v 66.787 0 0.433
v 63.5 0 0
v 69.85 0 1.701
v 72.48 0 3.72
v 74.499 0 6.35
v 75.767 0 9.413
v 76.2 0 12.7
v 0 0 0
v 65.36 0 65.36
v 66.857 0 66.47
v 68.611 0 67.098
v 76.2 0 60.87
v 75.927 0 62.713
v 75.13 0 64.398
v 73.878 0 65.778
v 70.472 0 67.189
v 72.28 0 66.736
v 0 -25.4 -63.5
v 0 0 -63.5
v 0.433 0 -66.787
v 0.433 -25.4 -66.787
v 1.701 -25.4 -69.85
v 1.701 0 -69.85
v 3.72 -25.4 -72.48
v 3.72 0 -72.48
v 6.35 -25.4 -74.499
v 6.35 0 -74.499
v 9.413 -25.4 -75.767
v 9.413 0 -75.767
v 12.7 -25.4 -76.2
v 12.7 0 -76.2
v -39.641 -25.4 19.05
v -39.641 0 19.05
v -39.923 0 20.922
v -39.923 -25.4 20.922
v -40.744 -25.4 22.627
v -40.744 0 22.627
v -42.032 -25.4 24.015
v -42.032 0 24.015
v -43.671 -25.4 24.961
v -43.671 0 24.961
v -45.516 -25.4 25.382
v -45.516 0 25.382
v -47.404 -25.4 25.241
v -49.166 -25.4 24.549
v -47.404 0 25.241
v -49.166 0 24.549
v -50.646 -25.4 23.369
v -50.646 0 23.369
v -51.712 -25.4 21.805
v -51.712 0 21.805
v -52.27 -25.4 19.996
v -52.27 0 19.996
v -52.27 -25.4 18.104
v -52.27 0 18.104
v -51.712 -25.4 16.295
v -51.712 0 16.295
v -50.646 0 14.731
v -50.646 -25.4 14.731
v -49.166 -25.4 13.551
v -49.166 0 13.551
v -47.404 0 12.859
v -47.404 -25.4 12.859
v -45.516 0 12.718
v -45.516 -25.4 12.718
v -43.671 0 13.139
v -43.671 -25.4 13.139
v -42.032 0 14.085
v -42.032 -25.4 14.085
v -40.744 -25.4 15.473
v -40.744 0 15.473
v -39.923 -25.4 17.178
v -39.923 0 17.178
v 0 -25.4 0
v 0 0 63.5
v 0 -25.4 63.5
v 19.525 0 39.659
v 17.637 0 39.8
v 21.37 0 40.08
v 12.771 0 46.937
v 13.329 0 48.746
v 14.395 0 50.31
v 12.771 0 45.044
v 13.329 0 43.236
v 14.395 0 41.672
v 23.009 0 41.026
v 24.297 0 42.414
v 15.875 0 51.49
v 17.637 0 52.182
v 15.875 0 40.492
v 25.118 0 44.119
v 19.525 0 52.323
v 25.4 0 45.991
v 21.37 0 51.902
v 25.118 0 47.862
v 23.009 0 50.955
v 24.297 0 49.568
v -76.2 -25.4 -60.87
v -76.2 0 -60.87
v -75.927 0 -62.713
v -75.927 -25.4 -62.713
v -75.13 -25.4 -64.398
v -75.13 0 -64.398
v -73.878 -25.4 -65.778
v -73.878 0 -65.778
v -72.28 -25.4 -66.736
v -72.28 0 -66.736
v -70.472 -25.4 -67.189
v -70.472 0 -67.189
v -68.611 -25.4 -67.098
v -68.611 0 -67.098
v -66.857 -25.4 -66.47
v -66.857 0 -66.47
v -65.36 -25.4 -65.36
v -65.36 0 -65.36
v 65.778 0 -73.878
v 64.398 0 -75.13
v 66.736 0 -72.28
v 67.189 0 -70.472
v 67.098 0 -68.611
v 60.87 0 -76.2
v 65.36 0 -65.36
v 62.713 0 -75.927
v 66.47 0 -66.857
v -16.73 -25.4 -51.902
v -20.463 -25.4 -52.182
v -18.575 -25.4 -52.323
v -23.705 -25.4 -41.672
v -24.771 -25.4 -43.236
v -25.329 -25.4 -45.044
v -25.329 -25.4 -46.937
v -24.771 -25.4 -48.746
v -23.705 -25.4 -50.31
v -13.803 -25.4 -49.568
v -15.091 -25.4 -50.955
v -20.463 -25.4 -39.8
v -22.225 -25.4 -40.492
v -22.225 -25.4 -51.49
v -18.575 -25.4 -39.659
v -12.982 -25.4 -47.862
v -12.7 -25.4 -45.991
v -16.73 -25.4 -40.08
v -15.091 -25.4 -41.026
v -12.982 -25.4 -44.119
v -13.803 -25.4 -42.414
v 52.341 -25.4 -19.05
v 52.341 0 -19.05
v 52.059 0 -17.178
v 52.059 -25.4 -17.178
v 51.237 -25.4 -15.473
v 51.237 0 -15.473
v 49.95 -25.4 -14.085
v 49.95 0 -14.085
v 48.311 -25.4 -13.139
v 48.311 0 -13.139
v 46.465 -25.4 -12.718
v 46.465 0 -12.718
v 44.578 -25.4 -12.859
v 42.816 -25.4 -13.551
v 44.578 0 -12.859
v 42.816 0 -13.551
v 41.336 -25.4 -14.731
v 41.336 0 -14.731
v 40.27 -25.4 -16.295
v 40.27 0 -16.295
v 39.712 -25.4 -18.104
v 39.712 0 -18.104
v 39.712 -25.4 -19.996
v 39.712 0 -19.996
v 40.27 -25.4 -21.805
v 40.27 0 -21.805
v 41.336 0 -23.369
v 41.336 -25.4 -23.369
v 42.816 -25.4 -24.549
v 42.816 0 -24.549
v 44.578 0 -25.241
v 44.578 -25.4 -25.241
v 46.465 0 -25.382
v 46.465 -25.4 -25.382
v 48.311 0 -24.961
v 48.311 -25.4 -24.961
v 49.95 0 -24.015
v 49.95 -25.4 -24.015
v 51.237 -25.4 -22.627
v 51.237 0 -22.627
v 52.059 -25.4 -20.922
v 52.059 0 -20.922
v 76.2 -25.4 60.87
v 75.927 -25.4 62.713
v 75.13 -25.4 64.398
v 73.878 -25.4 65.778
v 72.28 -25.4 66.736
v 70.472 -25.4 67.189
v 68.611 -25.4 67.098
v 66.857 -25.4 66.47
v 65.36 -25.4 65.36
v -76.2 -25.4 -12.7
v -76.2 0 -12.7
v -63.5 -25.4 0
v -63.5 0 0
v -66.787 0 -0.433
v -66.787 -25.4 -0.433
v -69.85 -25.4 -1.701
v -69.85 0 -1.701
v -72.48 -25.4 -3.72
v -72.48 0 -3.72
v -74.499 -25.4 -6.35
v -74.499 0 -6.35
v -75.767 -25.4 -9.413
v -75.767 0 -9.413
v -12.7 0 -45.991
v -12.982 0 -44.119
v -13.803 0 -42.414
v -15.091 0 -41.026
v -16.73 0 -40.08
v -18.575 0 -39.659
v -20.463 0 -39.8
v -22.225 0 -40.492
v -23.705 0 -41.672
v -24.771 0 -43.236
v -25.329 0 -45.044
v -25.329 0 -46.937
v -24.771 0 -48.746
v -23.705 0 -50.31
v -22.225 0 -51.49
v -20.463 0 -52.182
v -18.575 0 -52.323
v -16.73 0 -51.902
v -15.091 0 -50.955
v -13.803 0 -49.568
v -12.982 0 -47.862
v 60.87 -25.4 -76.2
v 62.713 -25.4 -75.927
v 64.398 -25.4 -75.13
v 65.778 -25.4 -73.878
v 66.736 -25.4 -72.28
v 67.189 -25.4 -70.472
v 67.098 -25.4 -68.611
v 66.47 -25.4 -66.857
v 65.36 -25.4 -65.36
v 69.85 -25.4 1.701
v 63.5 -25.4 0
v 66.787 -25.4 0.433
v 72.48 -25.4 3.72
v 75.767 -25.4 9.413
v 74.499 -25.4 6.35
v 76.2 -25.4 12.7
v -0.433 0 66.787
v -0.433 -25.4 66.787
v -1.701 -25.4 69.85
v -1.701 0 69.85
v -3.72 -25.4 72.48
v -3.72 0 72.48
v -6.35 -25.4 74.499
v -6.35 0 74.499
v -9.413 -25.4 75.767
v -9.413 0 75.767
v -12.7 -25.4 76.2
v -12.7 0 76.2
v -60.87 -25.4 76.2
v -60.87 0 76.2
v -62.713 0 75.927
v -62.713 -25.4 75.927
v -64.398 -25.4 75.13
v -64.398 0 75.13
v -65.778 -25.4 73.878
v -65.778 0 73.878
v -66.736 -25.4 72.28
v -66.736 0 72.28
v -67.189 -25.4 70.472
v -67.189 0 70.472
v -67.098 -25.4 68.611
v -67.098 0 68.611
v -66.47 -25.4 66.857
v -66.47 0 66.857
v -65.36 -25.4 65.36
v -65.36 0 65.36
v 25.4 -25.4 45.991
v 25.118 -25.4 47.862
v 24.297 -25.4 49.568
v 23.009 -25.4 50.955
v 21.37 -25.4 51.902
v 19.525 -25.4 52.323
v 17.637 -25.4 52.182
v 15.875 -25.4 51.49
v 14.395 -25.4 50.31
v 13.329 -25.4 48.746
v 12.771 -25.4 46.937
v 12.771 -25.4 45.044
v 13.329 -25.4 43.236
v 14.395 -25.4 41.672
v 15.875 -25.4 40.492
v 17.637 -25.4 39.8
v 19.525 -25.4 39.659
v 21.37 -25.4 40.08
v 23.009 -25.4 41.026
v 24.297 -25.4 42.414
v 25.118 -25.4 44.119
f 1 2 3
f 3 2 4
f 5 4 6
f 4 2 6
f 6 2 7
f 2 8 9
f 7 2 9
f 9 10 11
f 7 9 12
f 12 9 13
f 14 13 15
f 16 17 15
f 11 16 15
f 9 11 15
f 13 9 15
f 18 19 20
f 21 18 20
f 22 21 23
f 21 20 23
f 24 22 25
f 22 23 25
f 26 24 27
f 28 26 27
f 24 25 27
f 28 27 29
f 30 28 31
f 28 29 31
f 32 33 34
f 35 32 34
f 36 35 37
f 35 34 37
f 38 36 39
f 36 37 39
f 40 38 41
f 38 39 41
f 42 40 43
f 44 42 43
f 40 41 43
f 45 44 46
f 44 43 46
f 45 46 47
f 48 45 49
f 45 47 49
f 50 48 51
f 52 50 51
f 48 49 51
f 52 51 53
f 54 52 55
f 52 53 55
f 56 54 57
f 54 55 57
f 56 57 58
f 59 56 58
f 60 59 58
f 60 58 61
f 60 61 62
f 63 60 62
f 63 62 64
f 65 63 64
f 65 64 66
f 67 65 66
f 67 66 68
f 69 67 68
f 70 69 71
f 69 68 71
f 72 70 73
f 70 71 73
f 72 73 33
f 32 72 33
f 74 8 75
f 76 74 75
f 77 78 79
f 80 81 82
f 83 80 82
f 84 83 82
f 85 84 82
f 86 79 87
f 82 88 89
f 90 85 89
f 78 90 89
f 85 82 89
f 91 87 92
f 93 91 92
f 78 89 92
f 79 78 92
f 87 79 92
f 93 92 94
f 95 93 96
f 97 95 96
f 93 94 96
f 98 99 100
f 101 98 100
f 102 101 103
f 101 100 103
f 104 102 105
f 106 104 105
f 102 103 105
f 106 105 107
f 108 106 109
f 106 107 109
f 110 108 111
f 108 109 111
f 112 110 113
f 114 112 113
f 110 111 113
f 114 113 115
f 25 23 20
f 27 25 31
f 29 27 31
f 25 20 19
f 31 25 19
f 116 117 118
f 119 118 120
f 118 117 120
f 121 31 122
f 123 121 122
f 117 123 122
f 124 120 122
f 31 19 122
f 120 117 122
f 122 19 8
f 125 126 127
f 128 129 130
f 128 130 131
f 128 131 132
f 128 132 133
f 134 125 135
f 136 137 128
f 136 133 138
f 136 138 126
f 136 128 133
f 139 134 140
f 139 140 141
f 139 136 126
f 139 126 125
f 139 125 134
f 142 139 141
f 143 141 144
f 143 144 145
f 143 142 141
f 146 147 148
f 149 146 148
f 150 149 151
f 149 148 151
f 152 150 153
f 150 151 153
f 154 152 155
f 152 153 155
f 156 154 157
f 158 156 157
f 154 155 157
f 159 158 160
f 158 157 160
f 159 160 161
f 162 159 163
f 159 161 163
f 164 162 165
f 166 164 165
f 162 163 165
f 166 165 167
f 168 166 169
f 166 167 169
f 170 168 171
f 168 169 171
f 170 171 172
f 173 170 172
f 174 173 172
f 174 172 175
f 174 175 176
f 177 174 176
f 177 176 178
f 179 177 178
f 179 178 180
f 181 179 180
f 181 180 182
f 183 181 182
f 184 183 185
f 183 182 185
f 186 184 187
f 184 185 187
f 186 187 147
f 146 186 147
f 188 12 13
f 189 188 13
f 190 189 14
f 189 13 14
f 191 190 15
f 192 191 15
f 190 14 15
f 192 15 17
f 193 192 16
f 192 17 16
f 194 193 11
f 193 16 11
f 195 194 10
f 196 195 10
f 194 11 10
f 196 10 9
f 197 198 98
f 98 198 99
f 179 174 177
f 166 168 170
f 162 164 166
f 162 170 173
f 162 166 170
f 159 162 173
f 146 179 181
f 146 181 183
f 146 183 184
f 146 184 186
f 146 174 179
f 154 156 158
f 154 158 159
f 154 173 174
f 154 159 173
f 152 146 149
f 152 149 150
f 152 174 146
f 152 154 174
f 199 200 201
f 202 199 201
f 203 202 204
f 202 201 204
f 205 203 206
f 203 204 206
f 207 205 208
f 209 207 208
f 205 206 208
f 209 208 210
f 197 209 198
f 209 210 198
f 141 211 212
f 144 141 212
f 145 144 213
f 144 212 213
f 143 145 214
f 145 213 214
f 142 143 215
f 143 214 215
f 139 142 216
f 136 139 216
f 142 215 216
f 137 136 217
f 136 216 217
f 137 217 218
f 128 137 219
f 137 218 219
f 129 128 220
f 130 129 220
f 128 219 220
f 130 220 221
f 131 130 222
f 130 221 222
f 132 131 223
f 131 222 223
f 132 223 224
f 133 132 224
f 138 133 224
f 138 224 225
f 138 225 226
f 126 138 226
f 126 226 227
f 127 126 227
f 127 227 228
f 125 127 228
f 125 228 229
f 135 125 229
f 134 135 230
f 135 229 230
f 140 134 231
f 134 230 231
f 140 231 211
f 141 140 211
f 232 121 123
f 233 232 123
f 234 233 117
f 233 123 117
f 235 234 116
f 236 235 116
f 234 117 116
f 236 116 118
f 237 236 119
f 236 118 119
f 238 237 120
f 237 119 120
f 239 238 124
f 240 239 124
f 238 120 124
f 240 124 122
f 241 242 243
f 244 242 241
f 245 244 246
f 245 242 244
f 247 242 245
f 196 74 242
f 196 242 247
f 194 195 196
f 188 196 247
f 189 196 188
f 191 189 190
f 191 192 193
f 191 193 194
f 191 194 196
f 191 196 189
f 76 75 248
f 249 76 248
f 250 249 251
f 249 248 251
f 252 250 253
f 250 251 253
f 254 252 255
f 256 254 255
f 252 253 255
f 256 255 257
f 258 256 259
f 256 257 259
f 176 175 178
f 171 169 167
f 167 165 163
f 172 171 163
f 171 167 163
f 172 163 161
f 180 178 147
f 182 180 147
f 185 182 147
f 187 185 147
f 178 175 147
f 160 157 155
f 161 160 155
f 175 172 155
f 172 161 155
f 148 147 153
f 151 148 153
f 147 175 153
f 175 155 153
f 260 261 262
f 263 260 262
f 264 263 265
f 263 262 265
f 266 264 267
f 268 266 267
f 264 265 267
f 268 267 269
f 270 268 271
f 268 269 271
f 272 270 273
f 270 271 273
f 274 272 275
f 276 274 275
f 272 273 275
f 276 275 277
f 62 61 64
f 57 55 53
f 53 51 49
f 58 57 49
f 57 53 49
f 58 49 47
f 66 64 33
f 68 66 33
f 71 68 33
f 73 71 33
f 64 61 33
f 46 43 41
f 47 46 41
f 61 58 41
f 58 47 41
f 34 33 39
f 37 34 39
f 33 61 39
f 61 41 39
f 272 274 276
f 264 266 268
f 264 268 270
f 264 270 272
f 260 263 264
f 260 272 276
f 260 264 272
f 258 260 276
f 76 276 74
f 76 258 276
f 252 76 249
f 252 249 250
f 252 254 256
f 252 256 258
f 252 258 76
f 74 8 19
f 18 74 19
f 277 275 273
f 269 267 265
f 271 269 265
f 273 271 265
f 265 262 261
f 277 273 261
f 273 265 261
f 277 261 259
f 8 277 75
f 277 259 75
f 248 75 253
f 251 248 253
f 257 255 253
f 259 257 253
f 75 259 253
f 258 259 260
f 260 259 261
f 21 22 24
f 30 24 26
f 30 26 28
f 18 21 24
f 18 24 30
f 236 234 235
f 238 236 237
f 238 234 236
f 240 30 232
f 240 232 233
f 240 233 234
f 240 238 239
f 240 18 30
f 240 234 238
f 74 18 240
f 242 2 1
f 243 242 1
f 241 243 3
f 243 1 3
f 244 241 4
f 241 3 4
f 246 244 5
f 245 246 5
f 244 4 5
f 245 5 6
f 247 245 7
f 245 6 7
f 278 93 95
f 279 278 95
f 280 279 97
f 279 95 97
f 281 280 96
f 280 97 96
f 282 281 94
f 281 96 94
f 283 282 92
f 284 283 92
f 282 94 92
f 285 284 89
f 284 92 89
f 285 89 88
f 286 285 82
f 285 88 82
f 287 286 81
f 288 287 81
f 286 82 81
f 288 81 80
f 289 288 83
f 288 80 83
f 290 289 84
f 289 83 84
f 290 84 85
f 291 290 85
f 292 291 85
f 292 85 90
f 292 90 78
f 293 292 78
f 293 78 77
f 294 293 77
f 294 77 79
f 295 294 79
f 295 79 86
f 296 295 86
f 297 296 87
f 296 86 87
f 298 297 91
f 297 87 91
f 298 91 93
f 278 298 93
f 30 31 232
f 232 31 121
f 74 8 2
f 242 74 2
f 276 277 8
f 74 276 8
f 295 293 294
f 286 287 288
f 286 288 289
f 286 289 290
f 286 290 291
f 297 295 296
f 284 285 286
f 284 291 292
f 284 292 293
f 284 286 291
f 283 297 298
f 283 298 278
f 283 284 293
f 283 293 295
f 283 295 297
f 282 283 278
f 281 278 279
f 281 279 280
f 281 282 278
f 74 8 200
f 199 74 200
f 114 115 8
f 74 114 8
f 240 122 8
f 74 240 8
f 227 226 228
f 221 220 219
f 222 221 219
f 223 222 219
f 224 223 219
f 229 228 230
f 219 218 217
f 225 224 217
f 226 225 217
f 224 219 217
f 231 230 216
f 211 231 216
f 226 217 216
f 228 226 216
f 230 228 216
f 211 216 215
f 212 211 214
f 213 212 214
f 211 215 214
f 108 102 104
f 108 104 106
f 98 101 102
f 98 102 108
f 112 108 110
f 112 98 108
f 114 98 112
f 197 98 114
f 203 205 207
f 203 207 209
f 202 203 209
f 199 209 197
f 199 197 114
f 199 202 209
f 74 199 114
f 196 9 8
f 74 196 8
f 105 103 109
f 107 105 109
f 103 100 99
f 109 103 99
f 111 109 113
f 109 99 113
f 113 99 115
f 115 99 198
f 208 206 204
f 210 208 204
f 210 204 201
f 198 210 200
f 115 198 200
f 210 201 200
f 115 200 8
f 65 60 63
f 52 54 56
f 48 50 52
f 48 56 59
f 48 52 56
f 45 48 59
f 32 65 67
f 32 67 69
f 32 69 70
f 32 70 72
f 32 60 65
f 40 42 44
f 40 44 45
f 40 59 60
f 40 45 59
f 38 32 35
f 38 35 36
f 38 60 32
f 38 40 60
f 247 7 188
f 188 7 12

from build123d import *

# Parameters (mm, degrees)
F1_DEPTH = 25.4
F0_R     = 6.35


# Not quite as in the source:
# - the program builds the solid bodies; features that only make, move or delete a surface that nothing else refers to are left out


with BuildPart() as f1:
    # F0 (on Front) → F1 (new body)
    with BuildSketch(Plane.XZ):
        with BuildLine():
            Line((65.3598719395, 65.3598719395), (0, 0))
            Line((0, 0), (63.5, 0))
            ThreePointArc((63.5, 0), (72.4802561211, 3.7197438789), (76.2, 12.7))
            Line((76.2, 12.7), (76.2, 60.8697438789))
            ThreePointArc((76.2, 60.8697438789), (72.2800397955, 66.7363789104), (65.3598719395, 65.3598719395))
        make_face()
    extrude(amount=F1_DEPTH)


with BuildPart() as f1b:
    # F0 (on Front) → F1, piece 2 (new body)
    with BuildSketch(Plane.XZ):
        with BuildLine():
            Line((-65.3598719395, 65.3598719395), (0, 0))
            Line((0, 0), (0, 63.5))
            ThreePointArc((0, 63.5), (-3.7197438789, 72.4802561211), (-12.7, 76.2))
            Line((-12.7, 76.2), (-60.8697438789, 76.2))
            ThreePointArc((-60.8697438789, 76.2), (-66.7363789104, 72.2800397955), (-65.3598719395, 65.3598719395))
        make_face()
    extrude(amount=F1_DEPTH)


with BuildPart() as f1c:
    # F0 (on Front) → F1, piece 3 (new body)
    with BuildSketch(Plane.XZ):
        with BuildLine():
            Line((-65.3598719395, -65.3598719395), (0, 0))
            Line((0, 0), (-63.5, 0))
            ThreePointArc((-63.5, 0), (-72.4802561211, -3.7197438789), (-76.2, -12.7))
            Line((-76.2, -12.7), (-76.2, -60.8697438789))
            ThreePointArc((-76.2, -60.8697438789), (-72.2800397955, -66.7363789104), (-65.3598719395, -65.3598719395))
        make_face()
    extrude(amount=F1_DEPTH)


with BuildPart() as f1d:
    # F0 (on Front) → F1, piece 4 (new body)
    with BuildSketch(Plane.XZ):
        with BuildLine():
            Line((65.3598719395, -65.3598719395), (0, 0))
            Line((0, 0), (0, -63.5))
            ThreePointArc((0, -63.5), (3.7197438789, -72.4802561211), (12.7, -76.2))
            Line((12.7, -76.2), (60.8697438789, -76.2))
            ThreePointArc((60.8697438789, -76.2), (66.7363789104, -72.2800397955), (65.3598719395, -65.3598719395))
        make_face()
    extrude(amount=F1_DEPTH)


with BuildPart() as f1e:
    # F0 (on Front) → F1, piece 5 (new body)
    with BuildSketch(Plane.XZ):
        with Locations((-45.9907683632, 19.05)):
            Circle(F0_R)
    extrude(amount=F1_DEPTH)


with BuildPart() as f1f:
    # F0 (on Front) → F1, piece 6 (new body)
    with BuildSketch(Plane.XZ):
        with Locations((19.05, 45.9907683632)):
            Circle(F0_R)
    extrude(amount=F1_DEPTH)


with BuildPart() as f1g:
    # F0 (on Front) → F1, piece 7 (new body)
    with BuildSketch(Plane.XZ):
        with Locations((45.9907683632, -19.05)):
            Circle(F0_R)
    extrude(amount=F1_DEPTH)


with BuildPart() as f1h:
    # F0 (on Front) → F1, piece 8 (new body)
    with BuildSketch(Plane.XZ):
        with Locations((-19.05, -45.9907683632)):
            Circle(F0_R)
    extrude(amount=F1_DEPTH)


solid = Compound([f1.part, f1b.part, f1c.part, f1d.part, f1e.part, f1f.part, f1g.part, f1h.part])
